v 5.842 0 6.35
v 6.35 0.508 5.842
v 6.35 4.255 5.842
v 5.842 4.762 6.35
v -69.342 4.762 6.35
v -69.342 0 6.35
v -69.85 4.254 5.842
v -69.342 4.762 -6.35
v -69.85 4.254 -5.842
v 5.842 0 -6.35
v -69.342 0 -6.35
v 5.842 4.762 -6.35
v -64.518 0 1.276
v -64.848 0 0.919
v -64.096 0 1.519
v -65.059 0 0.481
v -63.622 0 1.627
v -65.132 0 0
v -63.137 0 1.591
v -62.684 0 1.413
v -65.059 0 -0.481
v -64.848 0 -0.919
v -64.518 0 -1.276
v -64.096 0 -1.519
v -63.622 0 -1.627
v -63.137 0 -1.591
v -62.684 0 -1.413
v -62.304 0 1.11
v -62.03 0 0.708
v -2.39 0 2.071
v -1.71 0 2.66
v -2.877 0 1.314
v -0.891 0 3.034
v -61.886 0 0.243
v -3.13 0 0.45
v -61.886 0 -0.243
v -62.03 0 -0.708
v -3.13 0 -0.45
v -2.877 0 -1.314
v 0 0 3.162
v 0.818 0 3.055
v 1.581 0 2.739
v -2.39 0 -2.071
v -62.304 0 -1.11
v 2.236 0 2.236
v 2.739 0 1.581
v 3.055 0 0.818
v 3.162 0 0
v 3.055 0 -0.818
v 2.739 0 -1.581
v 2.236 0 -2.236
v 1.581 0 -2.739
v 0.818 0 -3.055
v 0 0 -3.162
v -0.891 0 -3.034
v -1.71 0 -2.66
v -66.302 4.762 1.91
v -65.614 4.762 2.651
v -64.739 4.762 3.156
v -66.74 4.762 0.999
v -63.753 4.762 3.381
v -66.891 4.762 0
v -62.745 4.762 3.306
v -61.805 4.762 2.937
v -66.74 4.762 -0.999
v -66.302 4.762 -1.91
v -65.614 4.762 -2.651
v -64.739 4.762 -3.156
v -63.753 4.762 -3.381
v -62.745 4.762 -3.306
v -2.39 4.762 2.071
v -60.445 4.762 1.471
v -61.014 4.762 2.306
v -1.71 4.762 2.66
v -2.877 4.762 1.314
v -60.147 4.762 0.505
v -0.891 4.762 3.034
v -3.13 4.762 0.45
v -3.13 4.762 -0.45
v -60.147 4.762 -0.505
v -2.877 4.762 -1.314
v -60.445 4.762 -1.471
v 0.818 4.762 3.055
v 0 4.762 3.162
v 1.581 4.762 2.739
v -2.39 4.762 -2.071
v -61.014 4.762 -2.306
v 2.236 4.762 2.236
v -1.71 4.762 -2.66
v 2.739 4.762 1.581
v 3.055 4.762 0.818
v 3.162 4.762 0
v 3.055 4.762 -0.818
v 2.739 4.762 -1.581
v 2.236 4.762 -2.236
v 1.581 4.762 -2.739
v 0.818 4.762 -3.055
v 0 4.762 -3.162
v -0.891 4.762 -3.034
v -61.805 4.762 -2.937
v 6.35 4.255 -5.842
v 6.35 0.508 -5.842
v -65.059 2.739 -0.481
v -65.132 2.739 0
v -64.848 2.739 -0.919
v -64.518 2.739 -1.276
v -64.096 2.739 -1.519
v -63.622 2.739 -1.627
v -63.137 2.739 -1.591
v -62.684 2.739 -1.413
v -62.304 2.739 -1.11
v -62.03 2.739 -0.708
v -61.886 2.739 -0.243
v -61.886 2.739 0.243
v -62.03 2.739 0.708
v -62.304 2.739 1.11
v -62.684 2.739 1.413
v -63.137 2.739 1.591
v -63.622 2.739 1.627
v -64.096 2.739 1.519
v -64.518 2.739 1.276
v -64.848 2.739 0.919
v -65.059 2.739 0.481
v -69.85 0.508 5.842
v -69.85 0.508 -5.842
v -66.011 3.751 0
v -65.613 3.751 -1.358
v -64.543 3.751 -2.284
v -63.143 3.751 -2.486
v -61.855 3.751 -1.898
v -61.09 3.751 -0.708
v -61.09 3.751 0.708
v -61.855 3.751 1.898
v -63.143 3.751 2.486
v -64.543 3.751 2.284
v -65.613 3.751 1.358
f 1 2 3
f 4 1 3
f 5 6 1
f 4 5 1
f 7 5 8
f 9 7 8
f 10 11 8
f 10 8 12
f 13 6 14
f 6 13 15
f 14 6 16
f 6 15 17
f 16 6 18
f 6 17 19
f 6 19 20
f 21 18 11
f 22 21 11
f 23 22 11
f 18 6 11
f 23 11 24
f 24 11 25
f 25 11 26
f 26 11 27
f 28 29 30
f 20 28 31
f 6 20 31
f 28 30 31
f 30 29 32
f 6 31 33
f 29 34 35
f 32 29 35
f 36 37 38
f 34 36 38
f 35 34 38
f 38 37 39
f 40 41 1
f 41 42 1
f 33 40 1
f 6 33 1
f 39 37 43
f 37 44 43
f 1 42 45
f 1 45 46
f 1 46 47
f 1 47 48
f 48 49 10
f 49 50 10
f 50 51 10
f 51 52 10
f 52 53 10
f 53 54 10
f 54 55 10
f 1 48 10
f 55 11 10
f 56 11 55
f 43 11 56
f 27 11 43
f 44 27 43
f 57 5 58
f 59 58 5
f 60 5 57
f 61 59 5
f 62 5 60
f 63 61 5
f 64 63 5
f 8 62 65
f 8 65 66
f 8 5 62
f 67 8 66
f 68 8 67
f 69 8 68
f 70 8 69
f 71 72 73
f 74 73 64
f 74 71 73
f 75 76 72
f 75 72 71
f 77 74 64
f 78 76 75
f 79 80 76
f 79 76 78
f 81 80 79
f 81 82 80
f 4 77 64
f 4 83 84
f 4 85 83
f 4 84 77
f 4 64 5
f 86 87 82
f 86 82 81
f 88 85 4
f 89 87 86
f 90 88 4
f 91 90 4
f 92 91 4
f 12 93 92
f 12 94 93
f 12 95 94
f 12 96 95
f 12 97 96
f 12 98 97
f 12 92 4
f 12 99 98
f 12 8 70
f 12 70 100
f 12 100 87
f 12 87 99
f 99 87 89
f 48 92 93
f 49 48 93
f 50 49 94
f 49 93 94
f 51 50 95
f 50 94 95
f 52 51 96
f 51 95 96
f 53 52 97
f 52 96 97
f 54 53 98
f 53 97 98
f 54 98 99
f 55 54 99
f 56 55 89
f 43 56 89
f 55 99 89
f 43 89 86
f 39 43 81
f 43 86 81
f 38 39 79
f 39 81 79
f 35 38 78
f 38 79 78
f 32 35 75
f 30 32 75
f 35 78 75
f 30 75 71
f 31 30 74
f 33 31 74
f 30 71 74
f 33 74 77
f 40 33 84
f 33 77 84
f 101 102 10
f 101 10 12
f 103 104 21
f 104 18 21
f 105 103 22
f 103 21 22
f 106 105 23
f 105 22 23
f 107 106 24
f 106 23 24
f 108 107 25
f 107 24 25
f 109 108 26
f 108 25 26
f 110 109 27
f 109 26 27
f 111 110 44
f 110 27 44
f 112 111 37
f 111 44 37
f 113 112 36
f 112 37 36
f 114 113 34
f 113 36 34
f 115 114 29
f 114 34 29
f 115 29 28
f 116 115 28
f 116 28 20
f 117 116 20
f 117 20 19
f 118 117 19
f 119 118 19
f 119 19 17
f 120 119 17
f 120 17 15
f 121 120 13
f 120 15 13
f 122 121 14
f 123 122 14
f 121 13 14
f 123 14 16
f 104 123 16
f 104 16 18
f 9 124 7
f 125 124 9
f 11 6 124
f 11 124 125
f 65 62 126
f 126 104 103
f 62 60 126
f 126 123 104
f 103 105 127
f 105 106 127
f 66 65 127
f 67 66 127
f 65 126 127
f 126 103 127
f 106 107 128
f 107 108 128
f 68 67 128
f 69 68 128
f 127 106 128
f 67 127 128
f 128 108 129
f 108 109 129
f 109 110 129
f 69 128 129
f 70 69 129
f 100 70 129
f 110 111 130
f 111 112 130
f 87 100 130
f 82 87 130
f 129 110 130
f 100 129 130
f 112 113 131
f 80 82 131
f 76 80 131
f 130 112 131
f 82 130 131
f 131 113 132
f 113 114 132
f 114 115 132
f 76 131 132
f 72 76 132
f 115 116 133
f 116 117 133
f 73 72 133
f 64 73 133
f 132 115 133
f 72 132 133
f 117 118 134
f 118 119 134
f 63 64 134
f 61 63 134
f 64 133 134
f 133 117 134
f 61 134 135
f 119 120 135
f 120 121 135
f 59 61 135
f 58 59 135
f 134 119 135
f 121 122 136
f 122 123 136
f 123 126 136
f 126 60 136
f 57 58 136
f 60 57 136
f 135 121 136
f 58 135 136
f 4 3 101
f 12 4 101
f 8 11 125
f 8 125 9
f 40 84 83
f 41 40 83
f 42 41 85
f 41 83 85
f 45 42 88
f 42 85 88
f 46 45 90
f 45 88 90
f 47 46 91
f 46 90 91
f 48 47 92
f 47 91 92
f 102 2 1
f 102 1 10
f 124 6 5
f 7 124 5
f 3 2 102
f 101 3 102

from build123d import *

# Parameters (mm, degrees)
SKETCH1_W                                         = 76.2
SKETCH1_H                                         = 12.7
BOSS_EXTRUDE2_DEPTH                               = 4.7625
CSK_FOR_4_FLAT_HEAD_SOCKET_CAP_SCREW1_D           = 3.2639
CSK_FOR_4_FLAT_HEAD_SOCKET_CAP_SCREW1_CSINK_D     = 6.7818
CSK_FOR_4_FLAT_HEAD_SOCKET_CAP_SCREW1_CSINK_ANGLE = 82
CUT_EXTRUDE1_DEPTH                                = 5.7625
CHAMFER1_SIZE                                     = 0.508


with BuildPart() as part:
    # Sketch1 → Boss-Extrude2 (new body)
    with BuildSketch(Plane(origin=(0, 0, 0), x_dir=(1, 0, 0), z_dir=(0, 1, 0))):
        with Locations((-31.75, 0)):
            Rectangle(SKETCH1_W, SKETCH1_H)
    extrude(amount=BOSS_EXTRUDE2_DEPTH)

    # CSK for #4 Flat Head Socket Cap Screw1 (through all)
    with Locations(Plane(origin=(0, 4.7625, 0), x_dir=(1, 0, 0), z_dir=(0, 1, 0))):
        with Locations((-63.5, 0)):
            CounterSinkHole(CSK_FOR_4_FLAT_HEAD_SOCKET_CAP_SCREW1_D / 2, CSK_FOR_4_FLAT_HEAD_SOCKET_CAP_SCREW1_CSINK_D / 2, counter_sink_angle=CSK_FOR_4_FLAT_HEAD_SOCKET_CAP_SCREW1_CSINK_ANGLE)

    # Sketch2 → Cut-Extrude1 (cut, through all)
    with BuildSketch(Plane(origin=(0, 4.7625, 0), x_dir=(1, 0, 0), z_dir=(0, 1, 0))):
        with BuildLine():
            ThreePointArc((3.1623, 0), (2.236083774, 2.236083774), (0, 3.1623))
            Line((0, 3.1623), (0, -3.1623))
            ThreePointArc((0, -3.1623), (2.236083774, -2.236083774), (3.1623, 0))
        make_face()
        with BuildLine():
            Line((0, -3.1623), (0, 3.1623))
            ThreePointArc((0, 3.1623), (-3.1623, 0), (0, -3.1623))
        make_face()
    extrude(amount=-CUT_EXTRUDE1_DEPTH, mode=Mode.SUBTRACT)

    # Chamfer1
    chamfer1_edges = [part.edges().sort_by_distance(p)[0] for p in [
        (-69.85, 2.38125, 6.35),
        (-69.85, 2.38125, -6.35),
        (6.35, 2.38125, -6.35),
        (6.35, 2.38125, 6.35),
        (6.35, 4.7625, 0),
        (-69.85, 4.7625, 0),
        (-69.85, 0, 0),
        (6.35, 0, 0),
    ]]
    chamfer(chamfer1_edges, length=CHAMFER1_SIZE)


solid = part.part
